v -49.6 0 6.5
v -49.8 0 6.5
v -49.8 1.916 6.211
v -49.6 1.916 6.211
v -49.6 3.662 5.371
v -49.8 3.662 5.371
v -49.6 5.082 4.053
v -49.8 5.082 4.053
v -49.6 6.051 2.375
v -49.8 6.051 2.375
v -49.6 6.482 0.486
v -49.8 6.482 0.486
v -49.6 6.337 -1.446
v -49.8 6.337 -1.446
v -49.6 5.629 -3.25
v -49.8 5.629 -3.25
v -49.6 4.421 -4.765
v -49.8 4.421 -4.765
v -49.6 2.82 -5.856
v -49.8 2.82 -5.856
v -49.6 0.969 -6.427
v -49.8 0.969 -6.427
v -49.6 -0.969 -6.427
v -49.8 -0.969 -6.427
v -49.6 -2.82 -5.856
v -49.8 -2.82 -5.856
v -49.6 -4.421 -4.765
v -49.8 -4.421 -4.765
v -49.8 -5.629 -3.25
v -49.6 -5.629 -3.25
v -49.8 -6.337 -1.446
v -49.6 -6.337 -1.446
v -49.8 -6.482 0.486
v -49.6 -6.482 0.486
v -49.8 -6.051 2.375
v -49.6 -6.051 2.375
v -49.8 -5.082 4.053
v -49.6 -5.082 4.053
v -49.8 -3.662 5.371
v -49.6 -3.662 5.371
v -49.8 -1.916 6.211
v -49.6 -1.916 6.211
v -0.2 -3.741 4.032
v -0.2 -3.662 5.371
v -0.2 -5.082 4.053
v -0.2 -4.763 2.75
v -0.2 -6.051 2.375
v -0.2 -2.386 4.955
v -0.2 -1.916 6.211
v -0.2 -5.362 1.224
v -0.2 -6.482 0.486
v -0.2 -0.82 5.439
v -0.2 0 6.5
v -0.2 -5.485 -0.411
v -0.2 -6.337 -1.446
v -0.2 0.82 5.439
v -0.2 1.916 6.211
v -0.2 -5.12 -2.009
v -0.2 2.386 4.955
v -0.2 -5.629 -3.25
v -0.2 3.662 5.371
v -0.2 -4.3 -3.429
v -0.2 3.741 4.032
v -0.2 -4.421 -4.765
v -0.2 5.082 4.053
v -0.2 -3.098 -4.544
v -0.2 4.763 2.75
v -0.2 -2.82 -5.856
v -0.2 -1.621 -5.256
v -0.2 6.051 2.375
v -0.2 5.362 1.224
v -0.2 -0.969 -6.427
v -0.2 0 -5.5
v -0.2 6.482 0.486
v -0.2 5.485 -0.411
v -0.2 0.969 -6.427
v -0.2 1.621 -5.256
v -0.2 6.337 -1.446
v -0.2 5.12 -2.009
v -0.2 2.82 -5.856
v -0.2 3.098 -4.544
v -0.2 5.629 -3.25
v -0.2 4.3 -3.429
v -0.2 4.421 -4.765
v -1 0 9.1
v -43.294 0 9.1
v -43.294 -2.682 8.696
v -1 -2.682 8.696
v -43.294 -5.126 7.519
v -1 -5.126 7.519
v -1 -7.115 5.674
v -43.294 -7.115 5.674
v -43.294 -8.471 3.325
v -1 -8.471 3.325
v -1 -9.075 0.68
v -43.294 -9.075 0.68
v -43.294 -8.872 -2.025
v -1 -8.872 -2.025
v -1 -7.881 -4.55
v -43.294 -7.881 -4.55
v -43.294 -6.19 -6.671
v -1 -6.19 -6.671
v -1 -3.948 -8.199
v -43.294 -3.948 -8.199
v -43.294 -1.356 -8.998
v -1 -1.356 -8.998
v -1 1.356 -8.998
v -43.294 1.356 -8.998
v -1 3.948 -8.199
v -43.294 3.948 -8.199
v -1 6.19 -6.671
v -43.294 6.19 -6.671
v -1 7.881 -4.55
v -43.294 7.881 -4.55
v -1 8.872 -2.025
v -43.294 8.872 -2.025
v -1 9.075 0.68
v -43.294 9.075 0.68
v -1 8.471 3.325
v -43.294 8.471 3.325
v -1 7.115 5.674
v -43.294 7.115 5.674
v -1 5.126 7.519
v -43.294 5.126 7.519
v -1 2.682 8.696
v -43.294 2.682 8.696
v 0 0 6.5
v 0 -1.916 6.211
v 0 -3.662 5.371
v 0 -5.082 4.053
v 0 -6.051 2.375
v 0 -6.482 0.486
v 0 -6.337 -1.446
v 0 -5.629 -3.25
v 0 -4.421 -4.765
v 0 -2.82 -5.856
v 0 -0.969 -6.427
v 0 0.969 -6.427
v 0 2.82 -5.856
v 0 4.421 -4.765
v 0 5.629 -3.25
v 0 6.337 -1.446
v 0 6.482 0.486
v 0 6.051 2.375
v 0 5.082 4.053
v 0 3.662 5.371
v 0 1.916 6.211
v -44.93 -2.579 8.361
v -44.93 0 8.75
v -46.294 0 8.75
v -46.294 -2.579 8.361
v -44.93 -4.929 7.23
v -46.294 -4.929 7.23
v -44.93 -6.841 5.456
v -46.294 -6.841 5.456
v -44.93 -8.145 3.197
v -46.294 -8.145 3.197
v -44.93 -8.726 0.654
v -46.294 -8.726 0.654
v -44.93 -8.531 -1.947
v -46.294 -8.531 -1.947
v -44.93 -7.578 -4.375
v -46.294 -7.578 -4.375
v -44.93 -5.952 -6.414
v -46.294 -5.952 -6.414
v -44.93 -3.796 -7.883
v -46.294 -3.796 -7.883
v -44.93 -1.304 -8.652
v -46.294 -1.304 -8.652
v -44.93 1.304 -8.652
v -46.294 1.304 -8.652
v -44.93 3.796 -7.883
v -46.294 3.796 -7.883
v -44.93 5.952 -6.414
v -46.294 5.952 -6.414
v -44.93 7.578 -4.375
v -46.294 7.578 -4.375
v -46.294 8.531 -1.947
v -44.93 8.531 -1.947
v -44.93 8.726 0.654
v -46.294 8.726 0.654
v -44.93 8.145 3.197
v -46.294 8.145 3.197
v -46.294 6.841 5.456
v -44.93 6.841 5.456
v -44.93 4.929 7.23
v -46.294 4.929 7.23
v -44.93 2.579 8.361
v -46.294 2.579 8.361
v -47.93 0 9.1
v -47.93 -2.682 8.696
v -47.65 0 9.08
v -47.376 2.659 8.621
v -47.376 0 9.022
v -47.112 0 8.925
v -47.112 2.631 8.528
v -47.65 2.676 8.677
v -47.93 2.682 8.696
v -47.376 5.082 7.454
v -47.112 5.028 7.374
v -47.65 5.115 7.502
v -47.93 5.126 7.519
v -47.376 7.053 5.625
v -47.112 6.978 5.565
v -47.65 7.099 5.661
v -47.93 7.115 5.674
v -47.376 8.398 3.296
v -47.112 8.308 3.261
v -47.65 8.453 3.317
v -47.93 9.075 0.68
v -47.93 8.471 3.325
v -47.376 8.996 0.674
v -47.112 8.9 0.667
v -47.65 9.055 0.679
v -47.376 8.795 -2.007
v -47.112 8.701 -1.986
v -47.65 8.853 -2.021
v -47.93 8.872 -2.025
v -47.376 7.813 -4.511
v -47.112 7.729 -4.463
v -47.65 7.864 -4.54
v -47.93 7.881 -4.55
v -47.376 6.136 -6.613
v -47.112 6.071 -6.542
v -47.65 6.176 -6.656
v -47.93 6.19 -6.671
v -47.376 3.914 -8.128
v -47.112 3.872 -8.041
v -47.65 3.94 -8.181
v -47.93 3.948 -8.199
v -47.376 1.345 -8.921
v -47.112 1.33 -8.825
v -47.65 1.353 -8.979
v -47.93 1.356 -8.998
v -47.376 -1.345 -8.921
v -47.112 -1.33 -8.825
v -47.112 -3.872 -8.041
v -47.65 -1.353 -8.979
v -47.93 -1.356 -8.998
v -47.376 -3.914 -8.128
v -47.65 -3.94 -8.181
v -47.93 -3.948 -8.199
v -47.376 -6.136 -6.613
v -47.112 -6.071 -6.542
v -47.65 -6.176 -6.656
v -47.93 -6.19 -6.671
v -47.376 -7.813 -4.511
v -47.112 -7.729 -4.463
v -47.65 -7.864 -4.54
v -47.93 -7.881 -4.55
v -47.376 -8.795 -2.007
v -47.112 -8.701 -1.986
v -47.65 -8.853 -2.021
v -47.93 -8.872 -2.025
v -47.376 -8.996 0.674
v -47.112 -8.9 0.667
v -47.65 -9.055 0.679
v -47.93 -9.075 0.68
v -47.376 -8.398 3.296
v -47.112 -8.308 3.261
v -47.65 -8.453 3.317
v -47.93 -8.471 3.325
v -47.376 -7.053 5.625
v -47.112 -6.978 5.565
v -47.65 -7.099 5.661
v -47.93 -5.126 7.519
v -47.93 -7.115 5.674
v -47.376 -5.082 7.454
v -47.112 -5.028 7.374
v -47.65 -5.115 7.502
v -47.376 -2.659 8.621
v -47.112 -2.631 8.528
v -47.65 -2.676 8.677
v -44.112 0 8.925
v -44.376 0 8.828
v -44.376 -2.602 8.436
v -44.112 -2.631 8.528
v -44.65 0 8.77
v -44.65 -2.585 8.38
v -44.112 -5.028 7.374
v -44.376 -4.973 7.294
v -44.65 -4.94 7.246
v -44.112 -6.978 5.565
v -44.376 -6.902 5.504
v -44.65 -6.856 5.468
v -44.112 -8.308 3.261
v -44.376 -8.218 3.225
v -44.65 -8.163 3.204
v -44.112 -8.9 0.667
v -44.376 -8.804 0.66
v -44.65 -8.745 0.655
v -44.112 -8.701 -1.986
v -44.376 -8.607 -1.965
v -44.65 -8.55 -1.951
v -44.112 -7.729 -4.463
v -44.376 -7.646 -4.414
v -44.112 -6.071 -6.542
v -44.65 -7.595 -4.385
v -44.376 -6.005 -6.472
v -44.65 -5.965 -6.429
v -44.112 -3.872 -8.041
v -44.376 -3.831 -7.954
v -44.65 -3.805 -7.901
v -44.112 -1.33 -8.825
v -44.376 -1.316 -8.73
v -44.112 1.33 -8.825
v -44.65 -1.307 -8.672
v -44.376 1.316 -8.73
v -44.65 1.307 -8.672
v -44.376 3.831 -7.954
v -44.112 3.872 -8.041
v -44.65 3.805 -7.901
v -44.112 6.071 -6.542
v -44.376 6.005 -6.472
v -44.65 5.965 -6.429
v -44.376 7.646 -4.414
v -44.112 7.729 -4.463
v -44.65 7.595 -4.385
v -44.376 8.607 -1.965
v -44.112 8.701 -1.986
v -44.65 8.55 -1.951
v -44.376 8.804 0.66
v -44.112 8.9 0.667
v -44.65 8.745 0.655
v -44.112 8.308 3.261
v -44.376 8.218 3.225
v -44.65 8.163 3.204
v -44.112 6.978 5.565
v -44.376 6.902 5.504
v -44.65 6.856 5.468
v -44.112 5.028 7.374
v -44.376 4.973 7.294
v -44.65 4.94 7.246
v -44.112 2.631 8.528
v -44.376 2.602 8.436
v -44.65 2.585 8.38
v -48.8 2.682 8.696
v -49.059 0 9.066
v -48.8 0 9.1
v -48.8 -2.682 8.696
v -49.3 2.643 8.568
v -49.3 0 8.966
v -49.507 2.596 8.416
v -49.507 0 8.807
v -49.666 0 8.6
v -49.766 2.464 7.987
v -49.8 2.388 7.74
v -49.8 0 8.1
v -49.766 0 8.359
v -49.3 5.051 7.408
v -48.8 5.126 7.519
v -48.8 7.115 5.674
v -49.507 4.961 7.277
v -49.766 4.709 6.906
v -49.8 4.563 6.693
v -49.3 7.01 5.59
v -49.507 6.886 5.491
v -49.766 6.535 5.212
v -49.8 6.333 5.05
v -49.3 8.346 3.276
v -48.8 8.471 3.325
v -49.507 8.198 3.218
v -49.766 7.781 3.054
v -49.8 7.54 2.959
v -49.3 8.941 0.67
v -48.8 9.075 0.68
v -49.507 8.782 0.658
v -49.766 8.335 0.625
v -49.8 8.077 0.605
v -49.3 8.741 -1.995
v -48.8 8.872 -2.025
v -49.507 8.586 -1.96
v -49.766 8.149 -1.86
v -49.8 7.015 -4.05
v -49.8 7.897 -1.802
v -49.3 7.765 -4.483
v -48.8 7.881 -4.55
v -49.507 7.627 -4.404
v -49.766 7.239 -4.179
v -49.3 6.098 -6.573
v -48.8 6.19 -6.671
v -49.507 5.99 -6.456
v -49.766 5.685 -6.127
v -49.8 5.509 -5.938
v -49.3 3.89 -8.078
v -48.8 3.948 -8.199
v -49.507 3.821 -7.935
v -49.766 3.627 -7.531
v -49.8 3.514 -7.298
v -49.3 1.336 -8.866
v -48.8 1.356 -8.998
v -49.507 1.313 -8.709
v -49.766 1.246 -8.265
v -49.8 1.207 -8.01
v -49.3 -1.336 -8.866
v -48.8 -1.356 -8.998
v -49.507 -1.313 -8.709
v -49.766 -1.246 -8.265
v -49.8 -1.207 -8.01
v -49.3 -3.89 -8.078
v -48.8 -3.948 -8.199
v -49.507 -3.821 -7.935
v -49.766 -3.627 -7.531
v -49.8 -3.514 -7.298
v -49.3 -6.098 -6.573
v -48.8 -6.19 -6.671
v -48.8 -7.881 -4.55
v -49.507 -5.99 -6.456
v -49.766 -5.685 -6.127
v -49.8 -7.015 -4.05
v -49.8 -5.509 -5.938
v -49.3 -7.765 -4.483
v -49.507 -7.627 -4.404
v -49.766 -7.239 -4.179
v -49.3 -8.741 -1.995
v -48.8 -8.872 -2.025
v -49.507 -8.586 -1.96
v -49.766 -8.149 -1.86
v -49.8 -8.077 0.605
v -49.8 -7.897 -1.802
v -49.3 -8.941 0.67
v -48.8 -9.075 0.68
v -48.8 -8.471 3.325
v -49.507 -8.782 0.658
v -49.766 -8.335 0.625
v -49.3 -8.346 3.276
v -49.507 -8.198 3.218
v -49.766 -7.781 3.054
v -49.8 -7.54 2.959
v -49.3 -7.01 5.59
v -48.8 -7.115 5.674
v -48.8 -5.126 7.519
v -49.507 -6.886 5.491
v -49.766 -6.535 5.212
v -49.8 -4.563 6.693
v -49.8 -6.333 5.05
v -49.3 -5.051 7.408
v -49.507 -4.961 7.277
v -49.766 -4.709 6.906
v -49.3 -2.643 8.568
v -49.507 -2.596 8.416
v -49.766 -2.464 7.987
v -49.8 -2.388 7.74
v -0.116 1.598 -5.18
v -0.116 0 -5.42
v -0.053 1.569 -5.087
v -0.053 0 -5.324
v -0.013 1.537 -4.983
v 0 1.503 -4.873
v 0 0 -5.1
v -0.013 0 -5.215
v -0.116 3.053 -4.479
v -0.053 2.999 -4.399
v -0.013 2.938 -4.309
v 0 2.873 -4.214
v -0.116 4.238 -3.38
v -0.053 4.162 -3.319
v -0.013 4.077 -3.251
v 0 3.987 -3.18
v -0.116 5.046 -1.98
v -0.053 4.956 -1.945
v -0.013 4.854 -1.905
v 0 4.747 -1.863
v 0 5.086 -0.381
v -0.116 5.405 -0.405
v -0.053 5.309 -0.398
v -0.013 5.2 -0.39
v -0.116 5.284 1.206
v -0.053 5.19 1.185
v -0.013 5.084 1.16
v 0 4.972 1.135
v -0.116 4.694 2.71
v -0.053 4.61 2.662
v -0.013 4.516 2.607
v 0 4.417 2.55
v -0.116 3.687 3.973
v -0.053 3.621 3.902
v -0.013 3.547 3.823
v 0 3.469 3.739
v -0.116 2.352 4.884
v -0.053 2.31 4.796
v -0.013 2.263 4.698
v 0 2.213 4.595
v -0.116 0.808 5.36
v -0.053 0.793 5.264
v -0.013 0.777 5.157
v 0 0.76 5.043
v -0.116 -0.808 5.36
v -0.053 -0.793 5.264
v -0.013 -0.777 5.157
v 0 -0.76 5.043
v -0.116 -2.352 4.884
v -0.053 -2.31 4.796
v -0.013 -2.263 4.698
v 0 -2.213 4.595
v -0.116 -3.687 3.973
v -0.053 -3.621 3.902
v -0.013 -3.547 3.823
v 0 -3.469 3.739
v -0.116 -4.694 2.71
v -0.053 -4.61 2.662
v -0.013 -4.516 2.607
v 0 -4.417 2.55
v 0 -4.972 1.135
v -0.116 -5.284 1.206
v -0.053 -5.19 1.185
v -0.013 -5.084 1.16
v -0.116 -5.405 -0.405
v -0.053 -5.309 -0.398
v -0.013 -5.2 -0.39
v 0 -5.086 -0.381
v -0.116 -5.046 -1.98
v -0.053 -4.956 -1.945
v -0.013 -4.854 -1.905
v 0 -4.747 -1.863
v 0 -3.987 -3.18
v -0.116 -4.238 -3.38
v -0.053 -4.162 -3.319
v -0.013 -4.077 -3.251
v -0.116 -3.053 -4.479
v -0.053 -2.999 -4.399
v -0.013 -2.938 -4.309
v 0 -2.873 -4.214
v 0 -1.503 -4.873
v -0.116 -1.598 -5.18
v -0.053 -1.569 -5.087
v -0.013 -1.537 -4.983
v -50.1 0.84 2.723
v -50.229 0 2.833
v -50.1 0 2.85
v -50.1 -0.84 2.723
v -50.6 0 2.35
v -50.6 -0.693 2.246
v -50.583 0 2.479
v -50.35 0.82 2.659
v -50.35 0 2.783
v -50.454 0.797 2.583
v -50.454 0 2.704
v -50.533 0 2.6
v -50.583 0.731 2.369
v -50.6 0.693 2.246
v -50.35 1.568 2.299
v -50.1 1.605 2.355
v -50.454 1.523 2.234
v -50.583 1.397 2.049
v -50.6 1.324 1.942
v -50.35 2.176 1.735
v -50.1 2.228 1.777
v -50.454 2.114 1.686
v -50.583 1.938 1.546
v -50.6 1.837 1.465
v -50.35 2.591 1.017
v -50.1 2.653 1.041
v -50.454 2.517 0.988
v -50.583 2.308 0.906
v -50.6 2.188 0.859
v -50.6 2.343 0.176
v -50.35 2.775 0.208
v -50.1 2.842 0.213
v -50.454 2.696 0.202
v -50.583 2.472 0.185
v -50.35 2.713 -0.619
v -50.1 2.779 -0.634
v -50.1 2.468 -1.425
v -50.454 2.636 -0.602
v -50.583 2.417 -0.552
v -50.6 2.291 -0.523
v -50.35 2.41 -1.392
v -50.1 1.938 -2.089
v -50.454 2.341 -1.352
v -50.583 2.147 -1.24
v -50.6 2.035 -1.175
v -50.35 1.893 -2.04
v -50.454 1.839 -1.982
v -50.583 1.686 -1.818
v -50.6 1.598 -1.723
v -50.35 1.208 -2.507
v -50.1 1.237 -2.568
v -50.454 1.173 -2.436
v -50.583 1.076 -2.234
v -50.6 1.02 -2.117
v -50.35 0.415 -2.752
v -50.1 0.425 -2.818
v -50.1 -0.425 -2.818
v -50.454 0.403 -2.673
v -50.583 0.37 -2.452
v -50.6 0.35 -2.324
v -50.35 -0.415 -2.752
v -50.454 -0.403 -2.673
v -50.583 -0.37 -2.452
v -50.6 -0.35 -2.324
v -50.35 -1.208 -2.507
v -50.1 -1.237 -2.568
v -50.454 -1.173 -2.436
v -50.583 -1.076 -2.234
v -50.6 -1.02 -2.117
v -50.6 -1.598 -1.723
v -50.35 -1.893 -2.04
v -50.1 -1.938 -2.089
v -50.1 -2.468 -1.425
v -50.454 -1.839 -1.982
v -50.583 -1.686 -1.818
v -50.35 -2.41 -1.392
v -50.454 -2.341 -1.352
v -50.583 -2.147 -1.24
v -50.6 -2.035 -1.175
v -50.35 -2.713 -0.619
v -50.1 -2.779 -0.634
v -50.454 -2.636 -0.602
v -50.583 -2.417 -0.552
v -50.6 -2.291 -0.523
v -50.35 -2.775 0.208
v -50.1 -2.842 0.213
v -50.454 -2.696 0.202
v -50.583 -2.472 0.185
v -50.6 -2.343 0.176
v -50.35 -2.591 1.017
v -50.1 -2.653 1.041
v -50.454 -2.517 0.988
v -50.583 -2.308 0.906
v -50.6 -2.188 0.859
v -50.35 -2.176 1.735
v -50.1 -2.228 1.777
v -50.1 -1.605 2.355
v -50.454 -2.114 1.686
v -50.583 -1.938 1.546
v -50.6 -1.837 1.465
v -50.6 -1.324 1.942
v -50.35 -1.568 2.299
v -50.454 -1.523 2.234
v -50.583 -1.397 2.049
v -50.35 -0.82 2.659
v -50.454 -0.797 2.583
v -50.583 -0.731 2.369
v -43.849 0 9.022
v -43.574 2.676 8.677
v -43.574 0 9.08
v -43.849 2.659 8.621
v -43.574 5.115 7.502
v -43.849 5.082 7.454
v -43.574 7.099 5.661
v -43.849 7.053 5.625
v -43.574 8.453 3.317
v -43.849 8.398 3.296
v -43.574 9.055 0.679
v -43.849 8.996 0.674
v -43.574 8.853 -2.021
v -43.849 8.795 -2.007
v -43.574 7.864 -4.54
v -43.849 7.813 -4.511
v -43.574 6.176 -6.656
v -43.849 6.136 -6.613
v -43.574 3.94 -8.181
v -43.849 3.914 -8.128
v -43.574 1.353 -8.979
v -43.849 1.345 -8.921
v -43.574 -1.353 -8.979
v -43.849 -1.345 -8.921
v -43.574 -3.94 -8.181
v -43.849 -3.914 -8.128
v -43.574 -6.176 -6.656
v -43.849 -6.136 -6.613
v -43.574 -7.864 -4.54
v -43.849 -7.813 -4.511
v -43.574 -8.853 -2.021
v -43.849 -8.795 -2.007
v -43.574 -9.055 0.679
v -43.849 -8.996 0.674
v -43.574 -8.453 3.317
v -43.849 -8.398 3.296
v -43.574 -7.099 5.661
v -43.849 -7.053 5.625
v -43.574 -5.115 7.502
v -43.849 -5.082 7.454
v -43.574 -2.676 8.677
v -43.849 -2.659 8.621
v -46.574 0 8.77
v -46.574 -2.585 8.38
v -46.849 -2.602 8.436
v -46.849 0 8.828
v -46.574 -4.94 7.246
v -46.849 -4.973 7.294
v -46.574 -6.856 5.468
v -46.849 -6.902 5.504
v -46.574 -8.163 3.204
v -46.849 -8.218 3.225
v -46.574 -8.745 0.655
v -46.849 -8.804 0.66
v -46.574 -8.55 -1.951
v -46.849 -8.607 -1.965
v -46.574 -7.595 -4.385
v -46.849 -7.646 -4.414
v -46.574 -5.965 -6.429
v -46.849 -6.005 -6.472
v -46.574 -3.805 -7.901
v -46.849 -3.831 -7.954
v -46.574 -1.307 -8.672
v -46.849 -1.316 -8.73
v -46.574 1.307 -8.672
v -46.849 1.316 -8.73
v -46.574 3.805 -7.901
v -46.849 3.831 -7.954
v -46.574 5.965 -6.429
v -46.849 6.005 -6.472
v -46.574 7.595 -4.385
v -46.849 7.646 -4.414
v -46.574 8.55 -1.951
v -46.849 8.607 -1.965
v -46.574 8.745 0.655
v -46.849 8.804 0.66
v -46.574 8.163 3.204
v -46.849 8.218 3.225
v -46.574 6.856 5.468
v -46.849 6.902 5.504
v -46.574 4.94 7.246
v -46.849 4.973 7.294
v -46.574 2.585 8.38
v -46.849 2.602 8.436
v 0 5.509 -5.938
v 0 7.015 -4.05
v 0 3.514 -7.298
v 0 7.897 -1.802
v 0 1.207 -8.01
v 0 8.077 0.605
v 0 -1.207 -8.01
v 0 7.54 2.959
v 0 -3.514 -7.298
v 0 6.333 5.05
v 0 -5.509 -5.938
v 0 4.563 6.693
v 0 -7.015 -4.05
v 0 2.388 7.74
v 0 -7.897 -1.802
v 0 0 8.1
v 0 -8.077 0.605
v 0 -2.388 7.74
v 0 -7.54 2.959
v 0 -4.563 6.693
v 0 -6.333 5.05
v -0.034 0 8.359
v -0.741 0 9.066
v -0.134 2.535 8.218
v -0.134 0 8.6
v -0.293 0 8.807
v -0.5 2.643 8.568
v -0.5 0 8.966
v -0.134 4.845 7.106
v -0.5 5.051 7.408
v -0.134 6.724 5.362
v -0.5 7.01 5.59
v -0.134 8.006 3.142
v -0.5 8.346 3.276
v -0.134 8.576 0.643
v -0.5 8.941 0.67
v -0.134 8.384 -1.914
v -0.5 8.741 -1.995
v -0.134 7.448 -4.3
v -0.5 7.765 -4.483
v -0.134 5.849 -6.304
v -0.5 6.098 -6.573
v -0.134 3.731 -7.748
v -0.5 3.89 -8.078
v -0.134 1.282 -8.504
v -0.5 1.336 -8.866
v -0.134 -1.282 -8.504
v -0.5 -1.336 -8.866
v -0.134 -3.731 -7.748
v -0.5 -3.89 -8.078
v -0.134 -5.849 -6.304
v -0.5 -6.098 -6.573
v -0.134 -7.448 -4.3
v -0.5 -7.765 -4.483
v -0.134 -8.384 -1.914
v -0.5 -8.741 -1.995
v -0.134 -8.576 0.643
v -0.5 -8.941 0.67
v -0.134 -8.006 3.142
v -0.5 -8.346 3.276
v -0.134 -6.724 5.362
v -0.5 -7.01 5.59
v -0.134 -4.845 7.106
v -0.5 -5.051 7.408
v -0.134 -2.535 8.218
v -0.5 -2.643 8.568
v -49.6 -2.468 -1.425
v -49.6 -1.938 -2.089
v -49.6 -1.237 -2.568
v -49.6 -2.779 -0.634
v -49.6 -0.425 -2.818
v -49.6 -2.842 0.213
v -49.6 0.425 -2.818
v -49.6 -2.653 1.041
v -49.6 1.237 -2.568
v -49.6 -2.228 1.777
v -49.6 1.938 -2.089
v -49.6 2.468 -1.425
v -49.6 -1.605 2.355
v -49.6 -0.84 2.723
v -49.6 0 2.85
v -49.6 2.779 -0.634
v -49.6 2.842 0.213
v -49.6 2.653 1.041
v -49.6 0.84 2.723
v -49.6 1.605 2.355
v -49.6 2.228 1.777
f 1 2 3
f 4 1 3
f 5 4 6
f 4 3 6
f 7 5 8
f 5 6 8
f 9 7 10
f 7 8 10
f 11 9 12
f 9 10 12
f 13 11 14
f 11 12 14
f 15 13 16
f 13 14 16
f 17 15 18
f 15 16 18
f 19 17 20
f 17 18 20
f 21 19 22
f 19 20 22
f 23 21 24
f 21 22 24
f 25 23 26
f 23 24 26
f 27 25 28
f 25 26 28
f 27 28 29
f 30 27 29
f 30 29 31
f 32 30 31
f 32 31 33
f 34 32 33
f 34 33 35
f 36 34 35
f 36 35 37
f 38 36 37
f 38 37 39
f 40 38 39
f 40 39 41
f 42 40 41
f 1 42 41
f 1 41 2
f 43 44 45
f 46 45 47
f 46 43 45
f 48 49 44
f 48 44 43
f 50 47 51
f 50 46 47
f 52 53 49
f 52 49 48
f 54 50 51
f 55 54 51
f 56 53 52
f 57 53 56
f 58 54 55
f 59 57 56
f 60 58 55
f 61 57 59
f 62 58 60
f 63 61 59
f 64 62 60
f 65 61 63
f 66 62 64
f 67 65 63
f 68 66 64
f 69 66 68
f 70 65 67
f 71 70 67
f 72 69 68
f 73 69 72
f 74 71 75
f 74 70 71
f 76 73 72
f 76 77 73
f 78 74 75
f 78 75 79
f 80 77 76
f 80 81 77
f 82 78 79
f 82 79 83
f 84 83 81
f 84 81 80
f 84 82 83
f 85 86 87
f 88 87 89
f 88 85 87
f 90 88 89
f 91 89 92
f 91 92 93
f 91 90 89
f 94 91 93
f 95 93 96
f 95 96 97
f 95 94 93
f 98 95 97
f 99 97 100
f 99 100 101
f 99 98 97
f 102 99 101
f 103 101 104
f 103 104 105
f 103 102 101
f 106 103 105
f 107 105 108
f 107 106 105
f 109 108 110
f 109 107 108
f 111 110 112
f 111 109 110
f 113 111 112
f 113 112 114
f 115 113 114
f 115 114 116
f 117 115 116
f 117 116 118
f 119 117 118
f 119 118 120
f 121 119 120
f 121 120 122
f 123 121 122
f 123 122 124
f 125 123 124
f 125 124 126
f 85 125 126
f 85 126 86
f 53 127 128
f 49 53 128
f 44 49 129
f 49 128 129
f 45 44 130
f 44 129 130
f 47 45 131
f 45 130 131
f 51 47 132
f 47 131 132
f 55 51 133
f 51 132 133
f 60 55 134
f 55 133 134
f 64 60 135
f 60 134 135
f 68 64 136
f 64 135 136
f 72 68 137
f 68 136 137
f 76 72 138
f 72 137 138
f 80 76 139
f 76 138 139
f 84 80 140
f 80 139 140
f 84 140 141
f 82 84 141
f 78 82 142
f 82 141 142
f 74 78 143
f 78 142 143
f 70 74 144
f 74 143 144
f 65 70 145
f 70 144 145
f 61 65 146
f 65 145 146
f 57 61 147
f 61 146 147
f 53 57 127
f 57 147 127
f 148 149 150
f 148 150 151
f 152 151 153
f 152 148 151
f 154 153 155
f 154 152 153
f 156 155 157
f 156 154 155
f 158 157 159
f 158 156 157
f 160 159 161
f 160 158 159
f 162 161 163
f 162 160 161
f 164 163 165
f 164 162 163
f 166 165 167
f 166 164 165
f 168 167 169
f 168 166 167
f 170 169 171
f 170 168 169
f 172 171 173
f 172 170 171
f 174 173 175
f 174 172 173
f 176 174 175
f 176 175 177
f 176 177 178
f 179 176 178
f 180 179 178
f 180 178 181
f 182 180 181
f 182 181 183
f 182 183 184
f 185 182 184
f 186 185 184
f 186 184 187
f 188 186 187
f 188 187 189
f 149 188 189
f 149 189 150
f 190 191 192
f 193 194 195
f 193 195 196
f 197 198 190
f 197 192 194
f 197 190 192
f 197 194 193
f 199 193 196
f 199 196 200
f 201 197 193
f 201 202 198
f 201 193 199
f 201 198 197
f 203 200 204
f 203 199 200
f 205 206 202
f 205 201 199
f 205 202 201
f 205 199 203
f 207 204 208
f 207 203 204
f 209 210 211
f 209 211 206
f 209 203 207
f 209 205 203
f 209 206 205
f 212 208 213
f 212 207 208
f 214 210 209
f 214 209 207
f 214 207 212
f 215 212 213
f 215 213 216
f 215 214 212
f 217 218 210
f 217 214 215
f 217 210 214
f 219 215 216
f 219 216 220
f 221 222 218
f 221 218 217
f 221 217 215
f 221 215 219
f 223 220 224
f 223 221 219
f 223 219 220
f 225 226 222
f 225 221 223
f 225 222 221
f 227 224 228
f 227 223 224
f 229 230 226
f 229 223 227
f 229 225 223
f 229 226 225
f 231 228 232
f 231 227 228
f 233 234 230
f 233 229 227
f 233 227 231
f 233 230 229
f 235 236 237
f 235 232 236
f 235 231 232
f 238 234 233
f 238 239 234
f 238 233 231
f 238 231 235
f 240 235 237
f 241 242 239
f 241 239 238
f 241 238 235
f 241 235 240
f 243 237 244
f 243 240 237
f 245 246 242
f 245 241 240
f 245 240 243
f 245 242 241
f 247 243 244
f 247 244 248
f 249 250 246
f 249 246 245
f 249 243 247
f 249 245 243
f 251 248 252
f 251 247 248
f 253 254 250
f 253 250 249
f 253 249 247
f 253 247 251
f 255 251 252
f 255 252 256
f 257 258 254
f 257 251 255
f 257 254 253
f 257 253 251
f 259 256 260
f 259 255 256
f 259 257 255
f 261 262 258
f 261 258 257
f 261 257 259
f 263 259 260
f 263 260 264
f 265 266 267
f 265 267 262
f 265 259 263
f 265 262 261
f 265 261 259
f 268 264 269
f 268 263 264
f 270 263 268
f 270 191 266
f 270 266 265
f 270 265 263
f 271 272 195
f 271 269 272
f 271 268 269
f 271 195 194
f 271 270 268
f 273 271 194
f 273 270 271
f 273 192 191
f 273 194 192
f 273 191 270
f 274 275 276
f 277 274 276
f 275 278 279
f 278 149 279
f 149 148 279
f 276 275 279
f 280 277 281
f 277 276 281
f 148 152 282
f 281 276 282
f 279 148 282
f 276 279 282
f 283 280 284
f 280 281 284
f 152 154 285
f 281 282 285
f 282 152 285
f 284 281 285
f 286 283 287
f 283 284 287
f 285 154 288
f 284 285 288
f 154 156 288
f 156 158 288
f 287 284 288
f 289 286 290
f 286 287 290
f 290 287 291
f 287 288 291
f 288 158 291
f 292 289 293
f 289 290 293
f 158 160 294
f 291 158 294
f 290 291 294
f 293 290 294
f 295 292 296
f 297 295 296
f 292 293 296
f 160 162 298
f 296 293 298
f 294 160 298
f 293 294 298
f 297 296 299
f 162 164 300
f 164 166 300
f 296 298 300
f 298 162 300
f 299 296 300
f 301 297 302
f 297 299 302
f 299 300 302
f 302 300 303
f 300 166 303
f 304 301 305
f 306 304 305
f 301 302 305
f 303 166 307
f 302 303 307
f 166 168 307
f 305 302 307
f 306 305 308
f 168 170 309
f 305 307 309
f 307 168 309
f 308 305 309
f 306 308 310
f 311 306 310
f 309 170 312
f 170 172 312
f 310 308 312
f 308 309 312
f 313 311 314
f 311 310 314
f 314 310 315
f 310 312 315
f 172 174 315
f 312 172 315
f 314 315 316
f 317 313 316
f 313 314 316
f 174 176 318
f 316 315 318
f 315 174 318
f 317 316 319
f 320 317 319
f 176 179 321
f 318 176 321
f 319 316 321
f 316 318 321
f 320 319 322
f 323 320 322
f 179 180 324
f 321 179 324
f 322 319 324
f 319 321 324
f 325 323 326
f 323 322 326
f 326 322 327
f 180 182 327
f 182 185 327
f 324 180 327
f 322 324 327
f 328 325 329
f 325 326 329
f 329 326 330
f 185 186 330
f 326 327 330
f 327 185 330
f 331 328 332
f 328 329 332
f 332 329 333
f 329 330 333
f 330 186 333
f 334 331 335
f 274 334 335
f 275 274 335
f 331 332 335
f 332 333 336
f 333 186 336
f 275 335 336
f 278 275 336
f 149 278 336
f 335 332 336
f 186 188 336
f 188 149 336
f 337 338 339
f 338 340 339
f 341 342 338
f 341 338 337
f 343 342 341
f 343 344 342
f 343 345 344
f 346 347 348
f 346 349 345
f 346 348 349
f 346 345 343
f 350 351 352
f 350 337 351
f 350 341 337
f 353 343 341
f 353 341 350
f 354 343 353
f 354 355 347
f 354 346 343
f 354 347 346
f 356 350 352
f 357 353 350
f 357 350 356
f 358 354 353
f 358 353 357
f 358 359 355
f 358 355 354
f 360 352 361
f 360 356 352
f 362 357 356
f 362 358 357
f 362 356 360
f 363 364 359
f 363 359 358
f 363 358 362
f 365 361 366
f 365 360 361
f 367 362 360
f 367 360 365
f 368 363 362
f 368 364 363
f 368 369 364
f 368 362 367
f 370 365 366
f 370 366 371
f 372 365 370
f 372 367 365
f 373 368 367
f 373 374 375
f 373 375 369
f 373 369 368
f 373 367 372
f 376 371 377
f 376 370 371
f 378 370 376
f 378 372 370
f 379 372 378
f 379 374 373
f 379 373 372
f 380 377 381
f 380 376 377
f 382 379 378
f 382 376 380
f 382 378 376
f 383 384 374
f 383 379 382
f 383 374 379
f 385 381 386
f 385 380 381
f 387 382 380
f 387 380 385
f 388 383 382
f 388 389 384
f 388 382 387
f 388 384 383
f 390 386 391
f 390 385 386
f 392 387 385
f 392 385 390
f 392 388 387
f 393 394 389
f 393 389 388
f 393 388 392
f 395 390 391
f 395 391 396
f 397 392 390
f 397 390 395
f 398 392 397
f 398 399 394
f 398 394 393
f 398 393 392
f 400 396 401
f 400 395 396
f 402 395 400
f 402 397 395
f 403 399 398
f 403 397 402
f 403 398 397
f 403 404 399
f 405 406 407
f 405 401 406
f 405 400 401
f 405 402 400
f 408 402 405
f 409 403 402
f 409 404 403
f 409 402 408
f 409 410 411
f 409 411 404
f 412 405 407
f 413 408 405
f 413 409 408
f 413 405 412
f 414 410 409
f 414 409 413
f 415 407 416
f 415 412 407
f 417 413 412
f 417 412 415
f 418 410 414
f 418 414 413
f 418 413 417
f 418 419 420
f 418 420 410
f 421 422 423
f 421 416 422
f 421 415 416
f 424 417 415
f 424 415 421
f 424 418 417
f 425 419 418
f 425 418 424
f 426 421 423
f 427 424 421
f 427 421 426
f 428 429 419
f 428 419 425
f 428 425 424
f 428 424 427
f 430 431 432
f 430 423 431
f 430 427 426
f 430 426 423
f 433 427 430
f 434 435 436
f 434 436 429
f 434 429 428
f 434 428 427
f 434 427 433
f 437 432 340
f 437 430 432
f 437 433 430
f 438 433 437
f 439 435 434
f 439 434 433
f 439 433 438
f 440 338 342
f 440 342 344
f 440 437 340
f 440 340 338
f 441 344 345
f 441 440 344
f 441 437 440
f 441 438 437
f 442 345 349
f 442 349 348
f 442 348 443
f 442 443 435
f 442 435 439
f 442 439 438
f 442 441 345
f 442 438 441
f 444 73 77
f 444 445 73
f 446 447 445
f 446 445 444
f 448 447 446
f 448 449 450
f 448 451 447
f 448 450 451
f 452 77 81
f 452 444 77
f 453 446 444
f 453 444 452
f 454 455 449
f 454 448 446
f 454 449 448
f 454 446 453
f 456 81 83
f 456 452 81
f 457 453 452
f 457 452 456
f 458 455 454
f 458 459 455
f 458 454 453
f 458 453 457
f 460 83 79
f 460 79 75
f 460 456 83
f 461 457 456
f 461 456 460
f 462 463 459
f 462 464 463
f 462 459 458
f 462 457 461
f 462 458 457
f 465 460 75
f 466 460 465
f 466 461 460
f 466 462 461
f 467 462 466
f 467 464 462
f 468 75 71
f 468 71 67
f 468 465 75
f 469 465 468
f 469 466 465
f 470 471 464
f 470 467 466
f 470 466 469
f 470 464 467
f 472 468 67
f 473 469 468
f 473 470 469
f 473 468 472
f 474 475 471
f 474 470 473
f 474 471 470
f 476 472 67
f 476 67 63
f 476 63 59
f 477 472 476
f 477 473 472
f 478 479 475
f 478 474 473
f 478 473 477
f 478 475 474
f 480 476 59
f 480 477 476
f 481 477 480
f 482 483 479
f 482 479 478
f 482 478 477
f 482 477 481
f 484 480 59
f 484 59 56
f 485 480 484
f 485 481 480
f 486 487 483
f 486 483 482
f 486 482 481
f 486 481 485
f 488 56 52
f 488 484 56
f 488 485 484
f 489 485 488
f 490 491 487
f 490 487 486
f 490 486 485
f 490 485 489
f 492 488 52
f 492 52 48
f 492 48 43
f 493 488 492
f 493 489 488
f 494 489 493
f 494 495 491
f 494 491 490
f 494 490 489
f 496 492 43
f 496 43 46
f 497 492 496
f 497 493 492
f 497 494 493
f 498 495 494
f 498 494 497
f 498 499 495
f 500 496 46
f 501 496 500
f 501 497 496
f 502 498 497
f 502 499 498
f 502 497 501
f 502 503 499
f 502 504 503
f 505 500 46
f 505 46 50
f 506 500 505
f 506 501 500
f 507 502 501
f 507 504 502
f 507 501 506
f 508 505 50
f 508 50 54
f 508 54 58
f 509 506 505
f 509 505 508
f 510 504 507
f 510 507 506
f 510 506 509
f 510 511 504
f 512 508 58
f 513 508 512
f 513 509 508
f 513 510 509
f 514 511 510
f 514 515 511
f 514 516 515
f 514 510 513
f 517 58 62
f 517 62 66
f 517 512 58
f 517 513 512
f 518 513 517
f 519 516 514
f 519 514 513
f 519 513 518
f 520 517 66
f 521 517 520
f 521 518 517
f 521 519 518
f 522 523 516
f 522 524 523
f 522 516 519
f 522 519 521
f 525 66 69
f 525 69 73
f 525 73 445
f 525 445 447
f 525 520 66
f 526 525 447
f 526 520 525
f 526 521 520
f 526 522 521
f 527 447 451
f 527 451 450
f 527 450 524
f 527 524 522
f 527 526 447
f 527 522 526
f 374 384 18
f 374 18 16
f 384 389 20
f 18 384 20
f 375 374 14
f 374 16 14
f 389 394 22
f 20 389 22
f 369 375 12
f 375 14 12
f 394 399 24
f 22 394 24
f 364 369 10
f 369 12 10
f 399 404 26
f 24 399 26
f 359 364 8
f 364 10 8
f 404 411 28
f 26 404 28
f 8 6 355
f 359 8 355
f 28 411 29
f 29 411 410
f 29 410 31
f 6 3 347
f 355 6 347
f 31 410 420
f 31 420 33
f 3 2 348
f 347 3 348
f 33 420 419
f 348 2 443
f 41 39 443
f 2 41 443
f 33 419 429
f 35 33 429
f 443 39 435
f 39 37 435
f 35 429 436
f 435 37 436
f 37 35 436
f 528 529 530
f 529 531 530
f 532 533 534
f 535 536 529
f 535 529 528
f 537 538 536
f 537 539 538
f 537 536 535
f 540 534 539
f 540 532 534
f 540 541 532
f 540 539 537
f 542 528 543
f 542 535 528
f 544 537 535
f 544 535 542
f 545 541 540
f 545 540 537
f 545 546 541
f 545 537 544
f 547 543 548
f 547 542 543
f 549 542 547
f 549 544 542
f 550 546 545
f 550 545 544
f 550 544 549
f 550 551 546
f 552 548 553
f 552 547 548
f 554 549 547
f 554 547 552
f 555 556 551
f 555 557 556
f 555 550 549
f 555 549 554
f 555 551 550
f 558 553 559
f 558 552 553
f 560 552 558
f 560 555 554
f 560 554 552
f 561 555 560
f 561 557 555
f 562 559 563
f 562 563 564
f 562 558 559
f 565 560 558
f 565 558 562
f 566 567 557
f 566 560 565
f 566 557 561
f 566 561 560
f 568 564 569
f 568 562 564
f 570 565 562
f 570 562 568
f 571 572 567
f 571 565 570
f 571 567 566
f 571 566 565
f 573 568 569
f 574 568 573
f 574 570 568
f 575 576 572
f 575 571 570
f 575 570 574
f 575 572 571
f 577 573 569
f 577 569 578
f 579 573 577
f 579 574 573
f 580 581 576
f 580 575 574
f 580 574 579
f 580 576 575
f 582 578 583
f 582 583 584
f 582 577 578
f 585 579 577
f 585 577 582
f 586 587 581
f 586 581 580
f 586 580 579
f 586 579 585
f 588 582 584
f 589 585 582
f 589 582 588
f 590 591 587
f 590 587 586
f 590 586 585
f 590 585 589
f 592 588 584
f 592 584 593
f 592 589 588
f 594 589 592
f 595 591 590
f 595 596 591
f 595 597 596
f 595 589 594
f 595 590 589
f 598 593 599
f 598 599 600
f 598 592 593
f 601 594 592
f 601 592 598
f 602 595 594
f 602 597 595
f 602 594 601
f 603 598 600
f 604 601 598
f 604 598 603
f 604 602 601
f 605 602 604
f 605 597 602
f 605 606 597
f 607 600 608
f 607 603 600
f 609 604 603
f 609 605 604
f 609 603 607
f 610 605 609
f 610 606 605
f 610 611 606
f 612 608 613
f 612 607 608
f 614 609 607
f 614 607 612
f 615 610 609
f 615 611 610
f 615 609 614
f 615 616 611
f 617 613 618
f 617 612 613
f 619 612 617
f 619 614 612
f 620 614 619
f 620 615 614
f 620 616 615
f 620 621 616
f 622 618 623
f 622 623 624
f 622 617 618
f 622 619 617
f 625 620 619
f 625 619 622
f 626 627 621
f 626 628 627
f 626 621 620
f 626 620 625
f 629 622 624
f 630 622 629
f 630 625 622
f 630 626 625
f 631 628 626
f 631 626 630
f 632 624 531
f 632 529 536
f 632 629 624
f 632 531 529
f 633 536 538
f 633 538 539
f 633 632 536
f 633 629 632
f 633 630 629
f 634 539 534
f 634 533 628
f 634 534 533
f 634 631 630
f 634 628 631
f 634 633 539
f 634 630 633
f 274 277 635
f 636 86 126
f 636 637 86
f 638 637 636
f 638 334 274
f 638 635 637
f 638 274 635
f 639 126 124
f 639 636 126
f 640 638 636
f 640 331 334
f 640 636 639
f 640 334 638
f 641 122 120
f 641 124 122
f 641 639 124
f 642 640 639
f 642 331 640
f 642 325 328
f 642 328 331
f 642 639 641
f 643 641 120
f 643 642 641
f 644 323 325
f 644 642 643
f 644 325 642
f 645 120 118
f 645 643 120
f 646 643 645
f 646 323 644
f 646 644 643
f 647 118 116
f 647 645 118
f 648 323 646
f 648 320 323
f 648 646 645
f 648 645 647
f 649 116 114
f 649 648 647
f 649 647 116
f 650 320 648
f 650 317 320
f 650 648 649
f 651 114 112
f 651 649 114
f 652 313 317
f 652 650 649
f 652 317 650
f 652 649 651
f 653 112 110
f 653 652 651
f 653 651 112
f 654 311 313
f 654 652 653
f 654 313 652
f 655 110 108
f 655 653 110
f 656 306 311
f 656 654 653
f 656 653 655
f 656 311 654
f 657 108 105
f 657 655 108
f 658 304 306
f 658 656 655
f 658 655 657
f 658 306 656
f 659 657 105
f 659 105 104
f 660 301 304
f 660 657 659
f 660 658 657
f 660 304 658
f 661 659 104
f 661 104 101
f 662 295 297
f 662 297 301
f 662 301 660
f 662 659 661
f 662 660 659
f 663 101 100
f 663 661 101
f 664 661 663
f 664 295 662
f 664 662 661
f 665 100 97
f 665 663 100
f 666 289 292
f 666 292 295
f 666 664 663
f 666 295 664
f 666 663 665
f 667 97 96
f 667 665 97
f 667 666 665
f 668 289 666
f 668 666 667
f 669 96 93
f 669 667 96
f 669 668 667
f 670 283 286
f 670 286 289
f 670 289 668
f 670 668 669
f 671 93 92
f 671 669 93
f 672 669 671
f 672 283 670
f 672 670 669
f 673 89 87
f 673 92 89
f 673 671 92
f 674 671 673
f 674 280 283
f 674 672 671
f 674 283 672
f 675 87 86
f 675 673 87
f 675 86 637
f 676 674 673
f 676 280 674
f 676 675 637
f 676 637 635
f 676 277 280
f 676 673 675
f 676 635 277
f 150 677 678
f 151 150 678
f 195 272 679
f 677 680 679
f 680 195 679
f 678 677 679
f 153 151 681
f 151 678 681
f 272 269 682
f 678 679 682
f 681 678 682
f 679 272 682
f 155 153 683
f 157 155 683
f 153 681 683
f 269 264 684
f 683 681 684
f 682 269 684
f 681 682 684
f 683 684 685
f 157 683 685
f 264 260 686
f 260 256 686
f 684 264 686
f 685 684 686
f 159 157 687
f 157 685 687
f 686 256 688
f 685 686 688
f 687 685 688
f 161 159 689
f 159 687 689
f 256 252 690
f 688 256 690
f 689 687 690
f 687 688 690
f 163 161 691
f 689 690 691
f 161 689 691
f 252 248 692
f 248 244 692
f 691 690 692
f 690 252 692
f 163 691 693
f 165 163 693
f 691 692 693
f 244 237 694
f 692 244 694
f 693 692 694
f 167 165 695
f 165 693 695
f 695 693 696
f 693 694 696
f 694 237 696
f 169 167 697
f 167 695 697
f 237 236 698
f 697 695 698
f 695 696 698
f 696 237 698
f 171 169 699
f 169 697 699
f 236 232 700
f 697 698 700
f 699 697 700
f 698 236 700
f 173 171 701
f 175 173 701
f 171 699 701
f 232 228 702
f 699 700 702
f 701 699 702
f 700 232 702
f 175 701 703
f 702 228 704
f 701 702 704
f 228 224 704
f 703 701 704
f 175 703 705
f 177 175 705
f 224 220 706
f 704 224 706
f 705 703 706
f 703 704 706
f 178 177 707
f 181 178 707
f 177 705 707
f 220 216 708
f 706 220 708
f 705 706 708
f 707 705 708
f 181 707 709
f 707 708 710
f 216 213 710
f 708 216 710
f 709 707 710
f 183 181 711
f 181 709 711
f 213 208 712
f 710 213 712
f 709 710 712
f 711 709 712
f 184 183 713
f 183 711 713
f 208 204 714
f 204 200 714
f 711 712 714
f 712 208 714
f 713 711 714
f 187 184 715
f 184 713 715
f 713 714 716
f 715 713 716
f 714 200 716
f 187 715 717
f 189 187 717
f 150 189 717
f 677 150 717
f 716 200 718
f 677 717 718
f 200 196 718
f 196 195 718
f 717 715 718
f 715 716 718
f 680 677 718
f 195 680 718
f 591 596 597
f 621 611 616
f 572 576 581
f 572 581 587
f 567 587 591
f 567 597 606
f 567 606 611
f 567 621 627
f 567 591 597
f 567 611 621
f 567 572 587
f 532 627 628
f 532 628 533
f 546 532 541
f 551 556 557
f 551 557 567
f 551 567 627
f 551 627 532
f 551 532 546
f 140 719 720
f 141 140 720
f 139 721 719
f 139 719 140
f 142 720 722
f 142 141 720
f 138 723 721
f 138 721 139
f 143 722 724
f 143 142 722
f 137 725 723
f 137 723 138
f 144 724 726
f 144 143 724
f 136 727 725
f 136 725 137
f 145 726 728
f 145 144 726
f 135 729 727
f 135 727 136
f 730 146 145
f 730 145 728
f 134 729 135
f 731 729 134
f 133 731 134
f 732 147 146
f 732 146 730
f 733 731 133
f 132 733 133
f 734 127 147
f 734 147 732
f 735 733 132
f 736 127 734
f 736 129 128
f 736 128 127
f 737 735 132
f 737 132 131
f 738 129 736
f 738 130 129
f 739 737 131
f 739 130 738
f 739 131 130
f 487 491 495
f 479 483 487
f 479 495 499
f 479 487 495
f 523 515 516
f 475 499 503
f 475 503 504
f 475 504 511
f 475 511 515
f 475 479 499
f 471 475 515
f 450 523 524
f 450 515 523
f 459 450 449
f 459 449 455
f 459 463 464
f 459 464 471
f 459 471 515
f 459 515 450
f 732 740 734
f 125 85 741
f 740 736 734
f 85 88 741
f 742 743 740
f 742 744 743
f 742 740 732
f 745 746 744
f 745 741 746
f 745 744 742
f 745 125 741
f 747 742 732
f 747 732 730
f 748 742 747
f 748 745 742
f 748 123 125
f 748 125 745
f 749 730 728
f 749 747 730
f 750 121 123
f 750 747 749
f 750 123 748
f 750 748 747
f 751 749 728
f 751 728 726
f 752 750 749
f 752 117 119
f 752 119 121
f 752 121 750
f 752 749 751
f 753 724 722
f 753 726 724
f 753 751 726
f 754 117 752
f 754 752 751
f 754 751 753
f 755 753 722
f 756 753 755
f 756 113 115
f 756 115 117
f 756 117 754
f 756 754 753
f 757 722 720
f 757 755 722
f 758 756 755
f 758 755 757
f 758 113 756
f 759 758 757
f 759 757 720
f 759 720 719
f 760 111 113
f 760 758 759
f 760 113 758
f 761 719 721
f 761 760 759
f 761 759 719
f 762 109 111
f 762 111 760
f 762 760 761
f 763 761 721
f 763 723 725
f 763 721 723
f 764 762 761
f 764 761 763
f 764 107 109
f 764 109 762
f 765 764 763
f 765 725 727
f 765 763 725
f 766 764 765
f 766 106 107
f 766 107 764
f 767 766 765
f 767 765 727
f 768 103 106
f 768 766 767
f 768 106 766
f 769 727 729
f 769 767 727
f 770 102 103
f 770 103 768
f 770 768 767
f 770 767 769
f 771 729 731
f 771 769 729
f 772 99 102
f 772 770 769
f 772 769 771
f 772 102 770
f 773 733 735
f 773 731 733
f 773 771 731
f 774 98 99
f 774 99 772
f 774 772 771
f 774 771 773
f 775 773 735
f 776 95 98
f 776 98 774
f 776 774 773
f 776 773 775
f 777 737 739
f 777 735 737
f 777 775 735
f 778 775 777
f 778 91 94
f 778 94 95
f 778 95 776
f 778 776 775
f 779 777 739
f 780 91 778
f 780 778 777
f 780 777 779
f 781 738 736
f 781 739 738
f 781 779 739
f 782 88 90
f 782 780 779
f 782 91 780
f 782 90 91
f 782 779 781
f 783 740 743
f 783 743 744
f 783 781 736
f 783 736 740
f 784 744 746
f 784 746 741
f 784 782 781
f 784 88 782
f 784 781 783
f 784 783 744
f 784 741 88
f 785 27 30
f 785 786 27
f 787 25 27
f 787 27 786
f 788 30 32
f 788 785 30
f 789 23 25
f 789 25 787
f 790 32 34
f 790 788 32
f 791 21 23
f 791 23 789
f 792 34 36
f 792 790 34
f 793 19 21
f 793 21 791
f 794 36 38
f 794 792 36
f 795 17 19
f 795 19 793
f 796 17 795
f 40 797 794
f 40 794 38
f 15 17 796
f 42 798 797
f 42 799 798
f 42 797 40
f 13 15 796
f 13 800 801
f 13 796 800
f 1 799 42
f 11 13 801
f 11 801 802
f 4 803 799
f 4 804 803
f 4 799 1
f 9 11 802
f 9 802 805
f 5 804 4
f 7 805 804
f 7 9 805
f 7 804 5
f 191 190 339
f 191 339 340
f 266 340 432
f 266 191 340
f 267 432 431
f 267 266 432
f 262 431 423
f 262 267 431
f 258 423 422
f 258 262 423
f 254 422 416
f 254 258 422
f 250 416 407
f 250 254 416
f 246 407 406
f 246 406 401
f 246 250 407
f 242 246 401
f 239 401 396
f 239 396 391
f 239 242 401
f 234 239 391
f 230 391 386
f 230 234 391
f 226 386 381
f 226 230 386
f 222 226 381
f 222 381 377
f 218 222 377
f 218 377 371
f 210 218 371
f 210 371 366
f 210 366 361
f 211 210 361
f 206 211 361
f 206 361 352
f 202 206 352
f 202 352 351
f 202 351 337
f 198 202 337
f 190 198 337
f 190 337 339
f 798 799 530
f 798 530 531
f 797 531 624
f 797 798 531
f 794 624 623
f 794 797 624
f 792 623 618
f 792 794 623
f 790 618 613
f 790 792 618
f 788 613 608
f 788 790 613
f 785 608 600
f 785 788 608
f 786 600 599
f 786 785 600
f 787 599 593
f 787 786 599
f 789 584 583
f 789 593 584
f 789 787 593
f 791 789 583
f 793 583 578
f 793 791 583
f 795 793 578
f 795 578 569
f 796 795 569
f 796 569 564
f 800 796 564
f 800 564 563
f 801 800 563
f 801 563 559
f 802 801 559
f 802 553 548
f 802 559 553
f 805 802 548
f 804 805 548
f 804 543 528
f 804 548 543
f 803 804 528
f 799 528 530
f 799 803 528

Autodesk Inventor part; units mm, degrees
ref_plane "YZ Plane" through (0, 0, 0) normal (1, 0, 0) x (0, 1, 0)
ref_plane "XZ Plane" through (0, 0, 0) normal (0, 1, 0) x (-1, 0, 0)
sketch "Skizze1" plane through (0, 0, 0) normal (0, 1, 0) x (-1, 0, 0)
  line L0 (0, 0) -> (49.8, 0)
  line L1 (49.8, 0) -> (49.8, 9.1)
  line L2 (49.8, 9.1) -> (0, 9.1)
  line L3 (0, 9.1) -> (0, 0)
  line L4 (43.8, 9.1) -> (46.8, 9.1)
  line L5 (46.8, 9.1) -> (46.8, 8.75)
  line L6 (46.8, 8.75) -> (43.8, 8.75)
  line L7 (43.8, 8.75) -> (43.8, 9.1)
  line L8 (59.76, 0) -> (-9.96, 0) projected
  dimension "d0" = 49.8
  dimension "d1" = 9.1
  dimension "d2" = 3
  dimension "d3" = 3
  dimension "d4" = 0.35
revolve "Umdrehung1" add sketch "Skizze1" angle 360 about axis through (-10, 0, 0) along (1, 0, 0) contours L3 L2 L7 L6 L5 L1 L0
ref_plane "Arbeitsebene1" through (-24.9, 0, 0) normal (-1, 0, 0) x (0, 0, 1)
fillet "Rundung1" radius 2 4 edges at (-46.8, 0, -9.1) (-46.8, 0, -8.75) (-43.8, 0, -8.75) (-43.8, 0, -9.1)
fillet "Rundung2" radius 1 2 edges at (-49.8, 0, -9.1) (0, 0, -9.1)
sketch "Skizze2" plane through (-49.8, 0, 0) normal (-1, 0, 0) x (0, 0, 1)
  circle A0 centre (0, 0) radius 8.1 projected
  circle A1 centre (0, 0) radius 6.5
  dimension "d8" = 13
extrude "Extrusion1" cut sketch "Skizze2" against normal blind 0.2 contours A1
mirror "Spiegeln1" about plane through (-24.9, 0, 0) normal (-1, 0, 0) of "Extrusion1"
sketch "Skizze3" plane through (-49.6, 0, 0) normal (-1, 0, 0) x (0, 0, 1)
  circle A0 centre (0, 0) radius 6.5 projected
  circle A1 centre (0, 0) radius 2.85
  dimension "d11" = 5.7
extrude "Extrusion2" add sketch "Skizze3" along normal blind 1 contours A1
fillet "Rundung3" radius 0.5 1 edges at (-50.6, 0, -2.85)
sketch "Skizze4" plane through (-0.2, 0, 0) normal (1, 0, 0) x (0, 0, -1)
  circle A0 centre (0, 0) radius 6.5 projected
  circle A1 centre (0, 0) radius 5.5
  dimension "d15" = 1
extrude "Extrusion3" add sketch "Skizze4" along normal blind 0.2 contours A1
fillet "Rundung4" radius 0.5 1 edges at (0, 0, 5.5)
properties part number "accu_18500"
